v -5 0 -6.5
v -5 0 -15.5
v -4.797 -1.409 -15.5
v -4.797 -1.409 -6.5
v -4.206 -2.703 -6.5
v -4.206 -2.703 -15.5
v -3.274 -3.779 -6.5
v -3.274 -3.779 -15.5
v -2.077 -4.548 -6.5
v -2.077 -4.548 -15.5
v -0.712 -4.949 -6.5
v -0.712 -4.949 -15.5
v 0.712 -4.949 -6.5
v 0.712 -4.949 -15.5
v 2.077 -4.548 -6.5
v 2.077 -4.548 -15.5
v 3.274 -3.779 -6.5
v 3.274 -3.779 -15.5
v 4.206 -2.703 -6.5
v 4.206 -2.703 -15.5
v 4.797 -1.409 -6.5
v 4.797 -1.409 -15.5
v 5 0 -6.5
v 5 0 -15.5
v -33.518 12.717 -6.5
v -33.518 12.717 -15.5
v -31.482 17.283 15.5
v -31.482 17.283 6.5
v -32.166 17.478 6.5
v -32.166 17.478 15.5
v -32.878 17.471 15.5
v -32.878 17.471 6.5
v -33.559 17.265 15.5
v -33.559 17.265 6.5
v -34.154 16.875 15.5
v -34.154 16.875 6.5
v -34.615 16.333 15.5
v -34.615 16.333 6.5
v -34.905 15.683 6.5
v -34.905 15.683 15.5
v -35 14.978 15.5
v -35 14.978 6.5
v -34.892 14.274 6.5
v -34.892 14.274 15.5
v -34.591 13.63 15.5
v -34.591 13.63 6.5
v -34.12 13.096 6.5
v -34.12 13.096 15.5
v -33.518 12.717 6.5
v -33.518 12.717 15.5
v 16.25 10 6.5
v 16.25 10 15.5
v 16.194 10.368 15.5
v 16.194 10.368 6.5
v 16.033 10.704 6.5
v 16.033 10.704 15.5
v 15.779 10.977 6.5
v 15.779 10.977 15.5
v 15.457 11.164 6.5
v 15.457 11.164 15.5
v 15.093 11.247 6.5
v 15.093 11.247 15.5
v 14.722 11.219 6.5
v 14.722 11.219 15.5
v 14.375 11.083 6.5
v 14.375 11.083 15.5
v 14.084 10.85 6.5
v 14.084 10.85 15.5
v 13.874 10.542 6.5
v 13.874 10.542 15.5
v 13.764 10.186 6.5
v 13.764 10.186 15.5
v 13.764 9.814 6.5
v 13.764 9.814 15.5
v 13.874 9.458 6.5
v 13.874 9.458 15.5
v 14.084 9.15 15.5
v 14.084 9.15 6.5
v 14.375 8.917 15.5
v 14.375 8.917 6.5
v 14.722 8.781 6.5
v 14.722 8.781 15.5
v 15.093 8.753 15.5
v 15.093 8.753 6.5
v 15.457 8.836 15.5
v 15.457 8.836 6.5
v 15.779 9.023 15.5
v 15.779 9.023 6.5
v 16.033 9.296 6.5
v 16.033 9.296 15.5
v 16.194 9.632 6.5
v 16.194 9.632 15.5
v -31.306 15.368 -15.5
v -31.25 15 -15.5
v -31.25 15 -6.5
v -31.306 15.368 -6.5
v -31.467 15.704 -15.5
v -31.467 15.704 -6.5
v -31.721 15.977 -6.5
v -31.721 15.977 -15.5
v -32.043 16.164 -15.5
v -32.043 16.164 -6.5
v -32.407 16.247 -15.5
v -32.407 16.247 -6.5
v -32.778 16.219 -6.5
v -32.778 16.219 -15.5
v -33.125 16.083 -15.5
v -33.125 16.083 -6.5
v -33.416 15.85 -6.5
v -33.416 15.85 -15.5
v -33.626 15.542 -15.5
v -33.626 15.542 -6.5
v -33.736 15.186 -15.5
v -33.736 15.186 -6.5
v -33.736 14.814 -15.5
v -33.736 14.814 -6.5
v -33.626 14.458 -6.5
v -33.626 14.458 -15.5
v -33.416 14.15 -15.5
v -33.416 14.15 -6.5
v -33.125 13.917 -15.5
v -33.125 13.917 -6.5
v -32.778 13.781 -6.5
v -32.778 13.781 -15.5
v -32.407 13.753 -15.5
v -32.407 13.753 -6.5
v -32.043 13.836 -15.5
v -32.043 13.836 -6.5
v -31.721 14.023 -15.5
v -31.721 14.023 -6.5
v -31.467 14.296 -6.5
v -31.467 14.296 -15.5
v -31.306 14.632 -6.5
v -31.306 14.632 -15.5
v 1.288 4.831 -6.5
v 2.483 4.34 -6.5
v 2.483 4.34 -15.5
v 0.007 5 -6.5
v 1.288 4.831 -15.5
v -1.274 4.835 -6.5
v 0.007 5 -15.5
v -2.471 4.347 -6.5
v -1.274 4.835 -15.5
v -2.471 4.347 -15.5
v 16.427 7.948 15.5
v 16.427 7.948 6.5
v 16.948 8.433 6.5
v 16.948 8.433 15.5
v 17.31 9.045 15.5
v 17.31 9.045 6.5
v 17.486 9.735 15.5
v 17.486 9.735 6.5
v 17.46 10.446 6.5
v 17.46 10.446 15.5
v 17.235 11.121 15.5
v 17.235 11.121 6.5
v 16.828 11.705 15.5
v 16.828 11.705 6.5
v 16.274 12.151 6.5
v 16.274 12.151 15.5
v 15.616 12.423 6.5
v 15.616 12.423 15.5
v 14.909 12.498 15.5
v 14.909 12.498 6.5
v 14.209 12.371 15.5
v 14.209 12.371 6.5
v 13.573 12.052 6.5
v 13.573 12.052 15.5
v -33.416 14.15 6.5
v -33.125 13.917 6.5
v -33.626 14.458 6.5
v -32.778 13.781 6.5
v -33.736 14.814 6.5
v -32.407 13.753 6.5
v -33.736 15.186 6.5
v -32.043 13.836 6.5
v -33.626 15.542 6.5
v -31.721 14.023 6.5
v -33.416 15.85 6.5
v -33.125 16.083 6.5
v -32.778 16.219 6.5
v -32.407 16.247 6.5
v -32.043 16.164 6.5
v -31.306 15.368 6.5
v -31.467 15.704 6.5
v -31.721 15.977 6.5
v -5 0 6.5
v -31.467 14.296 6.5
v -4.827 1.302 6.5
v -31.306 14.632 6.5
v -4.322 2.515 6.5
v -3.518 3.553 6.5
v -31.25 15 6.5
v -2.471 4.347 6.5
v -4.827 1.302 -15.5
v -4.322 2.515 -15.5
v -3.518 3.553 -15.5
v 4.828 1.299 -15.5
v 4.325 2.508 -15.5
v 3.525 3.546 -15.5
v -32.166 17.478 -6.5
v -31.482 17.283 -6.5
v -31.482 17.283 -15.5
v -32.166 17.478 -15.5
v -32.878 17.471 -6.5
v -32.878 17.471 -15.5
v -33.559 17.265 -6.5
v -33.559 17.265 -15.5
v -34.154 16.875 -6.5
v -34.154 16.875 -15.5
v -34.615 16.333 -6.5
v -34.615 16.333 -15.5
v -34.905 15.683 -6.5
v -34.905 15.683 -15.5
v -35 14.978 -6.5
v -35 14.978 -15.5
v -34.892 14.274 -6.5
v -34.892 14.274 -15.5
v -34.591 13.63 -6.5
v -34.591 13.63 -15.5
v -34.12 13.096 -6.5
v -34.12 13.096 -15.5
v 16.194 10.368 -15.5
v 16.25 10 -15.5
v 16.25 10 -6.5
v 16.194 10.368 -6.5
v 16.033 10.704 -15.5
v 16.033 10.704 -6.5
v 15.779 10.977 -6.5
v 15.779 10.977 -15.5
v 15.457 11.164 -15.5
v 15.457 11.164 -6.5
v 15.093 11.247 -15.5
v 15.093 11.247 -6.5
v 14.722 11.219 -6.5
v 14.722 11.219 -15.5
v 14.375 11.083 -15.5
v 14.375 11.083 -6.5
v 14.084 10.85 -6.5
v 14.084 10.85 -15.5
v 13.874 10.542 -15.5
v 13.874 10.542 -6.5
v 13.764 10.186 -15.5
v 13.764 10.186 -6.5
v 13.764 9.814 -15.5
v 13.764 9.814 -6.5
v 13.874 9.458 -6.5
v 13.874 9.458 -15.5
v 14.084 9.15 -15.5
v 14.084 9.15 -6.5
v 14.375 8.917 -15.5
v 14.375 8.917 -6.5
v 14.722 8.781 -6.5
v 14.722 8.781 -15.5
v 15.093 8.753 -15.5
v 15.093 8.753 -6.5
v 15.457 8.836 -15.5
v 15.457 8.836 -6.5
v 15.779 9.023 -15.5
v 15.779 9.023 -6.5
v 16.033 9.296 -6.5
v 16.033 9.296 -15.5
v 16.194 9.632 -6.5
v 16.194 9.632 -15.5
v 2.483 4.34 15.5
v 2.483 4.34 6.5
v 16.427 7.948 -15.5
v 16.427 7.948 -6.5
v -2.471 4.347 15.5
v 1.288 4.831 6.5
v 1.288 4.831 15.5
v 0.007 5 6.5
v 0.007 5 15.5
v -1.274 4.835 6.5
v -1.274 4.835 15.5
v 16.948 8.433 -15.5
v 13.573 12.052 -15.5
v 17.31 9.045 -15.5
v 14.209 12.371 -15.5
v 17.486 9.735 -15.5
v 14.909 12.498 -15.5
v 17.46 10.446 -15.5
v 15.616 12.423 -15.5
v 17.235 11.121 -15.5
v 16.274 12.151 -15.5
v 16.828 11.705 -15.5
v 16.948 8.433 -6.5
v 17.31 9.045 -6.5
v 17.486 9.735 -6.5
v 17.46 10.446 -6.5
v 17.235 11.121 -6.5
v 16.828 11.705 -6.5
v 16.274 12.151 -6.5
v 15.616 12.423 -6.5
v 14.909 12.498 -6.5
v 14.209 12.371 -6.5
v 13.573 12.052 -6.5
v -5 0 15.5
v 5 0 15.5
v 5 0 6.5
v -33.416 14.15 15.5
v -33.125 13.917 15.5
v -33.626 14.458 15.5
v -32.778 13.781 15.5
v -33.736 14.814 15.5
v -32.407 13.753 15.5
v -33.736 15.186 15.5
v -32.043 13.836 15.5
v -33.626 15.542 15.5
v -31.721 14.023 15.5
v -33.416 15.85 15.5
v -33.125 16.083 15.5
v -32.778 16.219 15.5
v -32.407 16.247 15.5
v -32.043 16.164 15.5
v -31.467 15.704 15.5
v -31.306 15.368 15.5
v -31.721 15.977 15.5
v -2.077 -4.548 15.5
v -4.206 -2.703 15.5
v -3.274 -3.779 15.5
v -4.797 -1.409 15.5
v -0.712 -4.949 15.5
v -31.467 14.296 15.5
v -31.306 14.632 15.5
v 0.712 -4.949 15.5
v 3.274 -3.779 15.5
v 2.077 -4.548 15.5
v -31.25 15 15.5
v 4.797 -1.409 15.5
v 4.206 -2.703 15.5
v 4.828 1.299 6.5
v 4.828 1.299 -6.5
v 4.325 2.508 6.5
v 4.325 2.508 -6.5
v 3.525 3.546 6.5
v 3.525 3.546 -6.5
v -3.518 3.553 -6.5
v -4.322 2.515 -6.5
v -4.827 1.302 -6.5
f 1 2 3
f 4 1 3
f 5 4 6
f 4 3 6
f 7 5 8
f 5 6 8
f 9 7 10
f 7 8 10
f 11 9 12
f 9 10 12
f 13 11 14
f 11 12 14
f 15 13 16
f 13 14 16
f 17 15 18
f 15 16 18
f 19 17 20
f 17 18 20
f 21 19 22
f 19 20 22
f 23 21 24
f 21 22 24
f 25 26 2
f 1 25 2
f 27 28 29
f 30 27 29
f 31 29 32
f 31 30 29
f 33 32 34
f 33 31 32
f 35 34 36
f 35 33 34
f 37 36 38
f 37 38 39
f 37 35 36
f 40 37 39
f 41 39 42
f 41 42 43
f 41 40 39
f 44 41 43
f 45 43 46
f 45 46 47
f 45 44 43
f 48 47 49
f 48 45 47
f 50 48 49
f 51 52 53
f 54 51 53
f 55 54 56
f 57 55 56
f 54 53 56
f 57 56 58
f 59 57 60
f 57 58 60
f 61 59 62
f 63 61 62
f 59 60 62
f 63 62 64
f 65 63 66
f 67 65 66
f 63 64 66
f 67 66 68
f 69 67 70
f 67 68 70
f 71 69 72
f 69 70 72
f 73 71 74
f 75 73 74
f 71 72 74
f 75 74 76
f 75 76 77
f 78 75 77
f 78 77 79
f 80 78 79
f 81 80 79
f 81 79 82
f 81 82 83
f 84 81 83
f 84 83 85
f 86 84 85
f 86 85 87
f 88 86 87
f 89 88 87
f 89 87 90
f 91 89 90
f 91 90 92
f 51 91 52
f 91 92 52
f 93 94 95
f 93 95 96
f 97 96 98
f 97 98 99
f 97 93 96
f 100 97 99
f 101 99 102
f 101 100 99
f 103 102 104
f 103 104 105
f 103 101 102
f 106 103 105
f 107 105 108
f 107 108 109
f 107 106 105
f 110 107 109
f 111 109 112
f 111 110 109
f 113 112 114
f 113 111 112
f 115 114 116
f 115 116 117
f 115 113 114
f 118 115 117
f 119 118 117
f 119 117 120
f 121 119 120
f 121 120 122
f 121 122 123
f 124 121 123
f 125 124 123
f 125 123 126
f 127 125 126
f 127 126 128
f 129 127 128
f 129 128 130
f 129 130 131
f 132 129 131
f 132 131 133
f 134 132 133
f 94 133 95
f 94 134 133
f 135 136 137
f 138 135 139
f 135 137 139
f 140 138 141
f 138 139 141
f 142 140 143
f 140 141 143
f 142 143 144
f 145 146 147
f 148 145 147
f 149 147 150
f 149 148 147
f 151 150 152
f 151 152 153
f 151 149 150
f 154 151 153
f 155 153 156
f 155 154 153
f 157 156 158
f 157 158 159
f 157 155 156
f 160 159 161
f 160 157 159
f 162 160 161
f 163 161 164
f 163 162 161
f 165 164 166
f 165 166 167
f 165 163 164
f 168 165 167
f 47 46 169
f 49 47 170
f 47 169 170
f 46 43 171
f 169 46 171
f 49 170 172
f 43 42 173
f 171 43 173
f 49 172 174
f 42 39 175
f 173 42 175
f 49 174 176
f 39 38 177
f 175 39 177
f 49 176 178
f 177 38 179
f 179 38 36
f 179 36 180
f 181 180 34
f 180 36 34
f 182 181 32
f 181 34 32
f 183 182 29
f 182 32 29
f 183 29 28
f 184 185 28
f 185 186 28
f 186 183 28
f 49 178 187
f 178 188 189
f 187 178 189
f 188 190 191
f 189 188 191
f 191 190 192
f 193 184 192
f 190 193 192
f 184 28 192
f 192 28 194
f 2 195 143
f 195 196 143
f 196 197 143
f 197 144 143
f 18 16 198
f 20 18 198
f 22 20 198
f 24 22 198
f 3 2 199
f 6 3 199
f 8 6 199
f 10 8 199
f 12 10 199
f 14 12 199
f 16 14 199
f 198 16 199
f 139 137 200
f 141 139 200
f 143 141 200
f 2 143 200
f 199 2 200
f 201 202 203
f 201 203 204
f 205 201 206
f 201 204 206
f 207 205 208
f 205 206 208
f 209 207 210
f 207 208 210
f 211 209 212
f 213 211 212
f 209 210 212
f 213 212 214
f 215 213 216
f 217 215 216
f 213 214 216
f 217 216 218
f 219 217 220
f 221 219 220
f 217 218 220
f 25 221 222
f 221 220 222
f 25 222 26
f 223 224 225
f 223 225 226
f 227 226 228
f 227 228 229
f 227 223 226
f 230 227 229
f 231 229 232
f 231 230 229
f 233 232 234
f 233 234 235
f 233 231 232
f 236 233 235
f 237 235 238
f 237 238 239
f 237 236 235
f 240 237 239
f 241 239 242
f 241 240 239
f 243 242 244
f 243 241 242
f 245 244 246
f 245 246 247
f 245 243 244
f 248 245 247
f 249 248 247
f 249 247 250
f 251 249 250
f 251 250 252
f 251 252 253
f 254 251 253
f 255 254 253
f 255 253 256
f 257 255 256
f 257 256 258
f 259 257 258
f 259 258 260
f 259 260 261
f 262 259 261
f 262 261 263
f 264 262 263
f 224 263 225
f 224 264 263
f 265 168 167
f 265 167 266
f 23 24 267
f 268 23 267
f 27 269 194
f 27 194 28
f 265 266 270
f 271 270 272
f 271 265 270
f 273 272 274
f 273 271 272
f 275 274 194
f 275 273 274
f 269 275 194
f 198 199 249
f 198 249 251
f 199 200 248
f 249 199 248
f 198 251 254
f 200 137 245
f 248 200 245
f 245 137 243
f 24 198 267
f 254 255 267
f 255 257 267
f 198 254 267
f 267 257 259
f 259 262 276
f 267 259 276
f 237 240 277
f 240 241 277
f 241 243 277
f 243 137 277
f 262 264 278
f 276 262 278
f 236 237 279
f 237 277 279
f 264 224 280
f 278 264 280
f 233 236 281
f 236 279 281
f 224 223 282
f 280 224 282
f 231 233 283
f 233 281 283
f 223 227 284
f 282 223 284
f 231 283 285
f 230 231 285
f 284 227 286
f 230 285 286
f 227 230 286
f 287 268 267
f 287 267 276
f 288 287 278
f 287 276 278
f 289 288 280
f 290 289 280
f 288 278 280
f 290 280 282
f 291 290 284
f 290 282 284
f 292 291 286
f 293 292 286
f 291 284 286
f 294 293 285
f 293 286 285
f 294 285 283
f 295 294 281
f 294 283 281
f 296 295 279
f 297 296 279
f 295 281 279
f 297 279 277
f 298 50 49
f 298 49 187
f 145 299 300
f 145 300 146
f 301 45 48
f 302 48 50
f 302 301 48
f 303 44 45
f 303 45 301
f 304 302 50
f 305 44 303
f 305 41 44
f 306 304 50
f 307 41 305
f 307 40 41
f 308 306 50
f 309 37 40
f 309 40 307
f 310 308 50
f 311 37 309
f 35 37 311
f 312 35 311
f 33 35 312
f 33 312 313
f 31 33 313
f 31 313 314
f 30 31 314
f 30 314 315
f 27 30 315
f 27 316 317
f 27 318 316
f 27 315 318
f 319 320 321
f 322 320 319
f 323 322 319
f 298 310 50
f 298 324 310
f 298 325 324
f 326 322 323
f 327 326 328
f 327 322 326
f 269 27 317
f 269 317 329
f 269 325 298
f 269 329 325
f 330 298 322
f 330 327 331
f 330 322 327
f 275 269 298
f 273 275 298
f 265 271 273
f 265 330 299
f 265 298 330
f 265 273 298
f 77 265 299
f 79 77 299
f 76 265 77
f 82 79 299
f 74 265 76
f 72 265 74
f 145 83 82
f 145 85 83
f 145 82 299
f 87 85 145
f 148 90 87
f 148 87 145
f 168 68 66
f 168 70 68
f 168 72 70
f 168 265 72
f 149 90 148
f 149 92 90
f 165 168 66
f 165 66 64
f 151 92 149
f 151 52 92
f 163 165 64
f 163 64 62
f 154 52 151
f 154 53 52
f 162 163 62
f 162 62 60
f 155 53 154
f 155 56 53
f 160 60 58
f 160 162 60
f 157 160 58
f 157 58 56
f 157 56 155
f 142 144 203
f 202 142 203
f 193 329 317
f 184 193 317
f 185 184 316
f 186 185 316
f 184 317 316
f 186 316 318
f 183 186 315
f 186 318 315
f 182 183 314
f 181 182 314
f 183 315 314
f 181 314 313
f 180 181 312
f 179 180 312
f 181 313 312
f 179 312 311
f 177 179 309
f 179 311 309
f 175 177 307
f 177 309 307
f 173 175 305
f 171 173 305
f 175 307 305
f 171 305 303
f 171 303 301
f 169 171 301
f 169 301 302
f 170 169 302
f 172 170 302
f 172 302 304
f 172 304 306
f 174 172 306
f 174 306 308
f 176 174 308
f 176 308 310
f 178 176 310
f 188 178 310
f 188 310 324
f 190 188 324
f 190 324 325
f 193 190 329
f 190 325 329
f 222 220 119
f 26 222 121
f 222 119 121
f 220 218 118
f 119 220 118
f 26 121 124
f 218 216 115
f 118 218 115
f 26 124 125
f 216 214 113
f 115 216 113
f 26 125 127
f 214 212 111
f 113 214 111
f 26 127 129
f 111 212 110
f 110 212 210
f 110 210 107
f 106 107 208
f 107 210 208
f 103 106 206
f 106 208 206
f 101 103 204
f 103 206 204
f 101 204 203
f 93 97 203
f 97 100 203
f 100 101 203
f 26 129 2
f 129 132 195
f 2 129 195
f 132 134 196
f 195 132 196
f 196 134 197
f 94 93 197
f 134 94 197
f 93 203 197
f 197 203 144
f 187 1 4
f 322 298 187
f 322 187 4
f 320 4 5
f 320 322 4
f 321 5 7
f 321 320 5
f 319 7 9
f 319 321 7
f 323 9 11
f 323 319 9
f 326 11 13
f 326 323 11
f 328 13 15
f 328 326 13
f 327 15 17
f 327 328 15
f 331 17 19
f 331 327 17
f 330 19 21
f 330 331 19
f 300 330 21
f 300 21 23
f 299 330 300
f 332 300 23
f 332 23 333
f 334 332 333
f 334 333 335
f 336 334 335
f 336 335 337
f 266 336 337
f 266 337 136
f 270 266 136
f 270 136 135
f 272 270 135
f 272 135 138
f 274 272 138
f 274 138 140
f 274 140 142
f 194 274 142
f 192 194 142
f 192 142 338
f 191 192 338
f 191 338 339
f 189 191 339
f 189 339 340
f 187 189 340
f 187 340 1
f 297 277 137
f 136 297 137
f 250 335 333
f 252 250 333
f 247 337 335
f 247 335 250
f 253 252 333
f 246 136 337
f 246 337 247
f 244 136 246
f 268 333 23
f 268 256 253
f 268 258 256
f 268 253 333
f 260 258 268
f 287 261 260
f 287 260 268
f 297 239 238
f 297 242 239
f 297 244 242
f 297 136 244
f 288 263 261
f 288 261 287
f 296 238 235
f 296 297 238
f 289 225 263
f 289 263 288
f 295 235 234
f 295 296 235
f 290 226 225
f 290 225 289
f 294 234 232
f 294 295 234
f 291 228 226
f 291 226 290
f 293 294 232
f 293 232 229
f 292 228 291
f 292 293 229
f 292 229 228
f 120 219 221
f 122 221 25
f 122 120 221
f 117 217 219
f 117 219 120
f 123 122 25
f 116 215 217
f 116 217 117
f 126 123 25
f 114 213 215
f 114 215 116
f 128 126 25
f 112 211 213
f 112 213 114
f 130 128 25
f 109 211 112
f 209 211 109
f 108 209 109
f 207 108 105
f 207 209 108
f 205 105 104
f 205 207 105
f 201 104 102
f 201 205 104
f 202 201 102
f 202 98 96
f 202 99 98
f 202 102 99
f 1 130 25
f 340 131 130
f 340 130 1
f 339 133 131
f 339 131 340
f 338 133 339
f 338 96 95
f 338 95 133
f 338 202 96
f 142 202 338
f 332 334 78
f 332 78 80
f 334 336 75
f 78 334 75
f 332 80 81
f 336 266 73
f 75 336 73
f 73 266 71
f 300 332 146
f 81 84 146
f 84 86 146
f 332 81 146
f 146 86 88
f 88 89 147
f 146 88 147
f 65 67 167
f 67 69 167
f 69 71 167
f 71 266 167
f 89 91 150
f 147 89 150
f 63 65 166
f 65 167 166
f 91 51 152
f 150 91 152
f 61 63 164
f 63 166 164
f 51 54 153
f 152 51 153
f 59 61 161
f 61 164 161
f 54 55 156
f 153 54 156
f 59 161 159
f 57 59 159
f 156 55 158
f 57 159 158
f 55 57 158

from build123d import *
from build123d.topology import SkipClean

# Parameters (mm, degrees)
SKETCH1_R           = 5
BOSS_EXTRUDE3_DEPTH = 6.5
BOSS_EXTRUDE4_START = 9
SKETCH3_R           = 1.25
SKETCH3_R_2         = 5
BOSS_EXTRUDE4_DEPTH = 9


with BuildPart() as part:
    # Sketch1 → Boss-Extrude3 (new, symmetric)
    with BuildSketch(Plane.XY):
        with Locations(Location((0, 0, 0), (0, 0, 180))):
            Circle(SKETCH1_R)
    extrude(amount=BOSS_EXTRUDE3_DEPTH, both=True)

    # Sketch3 → Boss-Extrude4 (add)
    # profile 1 of 3: a face of its own
    with BuildSketch(Plane.XY.offset(6.5).offset(BOSS_EXTRUDE4_START)):
        with BuildLine():
            ThreePointArc((2.483058563, 4.339864073), (4.325233682, 2.508456416), (5, 0))
            Line((5, 0), (16.427426363, 7.947573637))
            ThreePointArc((16.427426363, 7.947573637), (17.052426363, 11.427426363), (13.572573637, 12.052426363))
            Line((13.572573637, 12.052426363), (2.483058563, 4.339864073))
        make_face()
        with Locations((15, 10)):
            Circle(SKETCH3_R, mode=Mode.SUBTRACT)
    # profile 2 of 3: a face of its own
    with BuildSketch(Plane.XY.offset(6.5).offset(BOSS_EXTRUDE4_START)):
        with BuildLine():
            Line((-33.518152484, 12.716720446), (-5, 0))
            ThreePointArc((-5, 0), (-4.321713979, 2.514515517), (-2.470884686, 4.346806744))
            Line((-2.470884686, 4.346806744), (-31.481847516, 17.283279554))
            ThreePointArc((-31.481847516, 17.283279554), (-34.783279554, 16.018152484), (-33.518152484, 12.716720446))
        make_face()
        with Locations((-32.5, 15)):
            Circle(SKETCH3_R, mode=Mode.SUBTRACT)
    # profile 3 of 3: a face of its own
    with BuildSketch(Plane.XY.offset(6.5).offset(BOSS_EXTRUDE4_START)):
        Circle(SKETCH3_R_2)
    boss_extrude4 = extrude(amount=-BOSS_EXTRUDE4_DEPTH)

    # Mirror12: Boss-Extrude4 across plane
    with SkipClean():  # the faces are left unmerged after this step: merging them gives an invalid solid
        add(boss_extrude4.mirror(Plane.XY))


solid = part.part
